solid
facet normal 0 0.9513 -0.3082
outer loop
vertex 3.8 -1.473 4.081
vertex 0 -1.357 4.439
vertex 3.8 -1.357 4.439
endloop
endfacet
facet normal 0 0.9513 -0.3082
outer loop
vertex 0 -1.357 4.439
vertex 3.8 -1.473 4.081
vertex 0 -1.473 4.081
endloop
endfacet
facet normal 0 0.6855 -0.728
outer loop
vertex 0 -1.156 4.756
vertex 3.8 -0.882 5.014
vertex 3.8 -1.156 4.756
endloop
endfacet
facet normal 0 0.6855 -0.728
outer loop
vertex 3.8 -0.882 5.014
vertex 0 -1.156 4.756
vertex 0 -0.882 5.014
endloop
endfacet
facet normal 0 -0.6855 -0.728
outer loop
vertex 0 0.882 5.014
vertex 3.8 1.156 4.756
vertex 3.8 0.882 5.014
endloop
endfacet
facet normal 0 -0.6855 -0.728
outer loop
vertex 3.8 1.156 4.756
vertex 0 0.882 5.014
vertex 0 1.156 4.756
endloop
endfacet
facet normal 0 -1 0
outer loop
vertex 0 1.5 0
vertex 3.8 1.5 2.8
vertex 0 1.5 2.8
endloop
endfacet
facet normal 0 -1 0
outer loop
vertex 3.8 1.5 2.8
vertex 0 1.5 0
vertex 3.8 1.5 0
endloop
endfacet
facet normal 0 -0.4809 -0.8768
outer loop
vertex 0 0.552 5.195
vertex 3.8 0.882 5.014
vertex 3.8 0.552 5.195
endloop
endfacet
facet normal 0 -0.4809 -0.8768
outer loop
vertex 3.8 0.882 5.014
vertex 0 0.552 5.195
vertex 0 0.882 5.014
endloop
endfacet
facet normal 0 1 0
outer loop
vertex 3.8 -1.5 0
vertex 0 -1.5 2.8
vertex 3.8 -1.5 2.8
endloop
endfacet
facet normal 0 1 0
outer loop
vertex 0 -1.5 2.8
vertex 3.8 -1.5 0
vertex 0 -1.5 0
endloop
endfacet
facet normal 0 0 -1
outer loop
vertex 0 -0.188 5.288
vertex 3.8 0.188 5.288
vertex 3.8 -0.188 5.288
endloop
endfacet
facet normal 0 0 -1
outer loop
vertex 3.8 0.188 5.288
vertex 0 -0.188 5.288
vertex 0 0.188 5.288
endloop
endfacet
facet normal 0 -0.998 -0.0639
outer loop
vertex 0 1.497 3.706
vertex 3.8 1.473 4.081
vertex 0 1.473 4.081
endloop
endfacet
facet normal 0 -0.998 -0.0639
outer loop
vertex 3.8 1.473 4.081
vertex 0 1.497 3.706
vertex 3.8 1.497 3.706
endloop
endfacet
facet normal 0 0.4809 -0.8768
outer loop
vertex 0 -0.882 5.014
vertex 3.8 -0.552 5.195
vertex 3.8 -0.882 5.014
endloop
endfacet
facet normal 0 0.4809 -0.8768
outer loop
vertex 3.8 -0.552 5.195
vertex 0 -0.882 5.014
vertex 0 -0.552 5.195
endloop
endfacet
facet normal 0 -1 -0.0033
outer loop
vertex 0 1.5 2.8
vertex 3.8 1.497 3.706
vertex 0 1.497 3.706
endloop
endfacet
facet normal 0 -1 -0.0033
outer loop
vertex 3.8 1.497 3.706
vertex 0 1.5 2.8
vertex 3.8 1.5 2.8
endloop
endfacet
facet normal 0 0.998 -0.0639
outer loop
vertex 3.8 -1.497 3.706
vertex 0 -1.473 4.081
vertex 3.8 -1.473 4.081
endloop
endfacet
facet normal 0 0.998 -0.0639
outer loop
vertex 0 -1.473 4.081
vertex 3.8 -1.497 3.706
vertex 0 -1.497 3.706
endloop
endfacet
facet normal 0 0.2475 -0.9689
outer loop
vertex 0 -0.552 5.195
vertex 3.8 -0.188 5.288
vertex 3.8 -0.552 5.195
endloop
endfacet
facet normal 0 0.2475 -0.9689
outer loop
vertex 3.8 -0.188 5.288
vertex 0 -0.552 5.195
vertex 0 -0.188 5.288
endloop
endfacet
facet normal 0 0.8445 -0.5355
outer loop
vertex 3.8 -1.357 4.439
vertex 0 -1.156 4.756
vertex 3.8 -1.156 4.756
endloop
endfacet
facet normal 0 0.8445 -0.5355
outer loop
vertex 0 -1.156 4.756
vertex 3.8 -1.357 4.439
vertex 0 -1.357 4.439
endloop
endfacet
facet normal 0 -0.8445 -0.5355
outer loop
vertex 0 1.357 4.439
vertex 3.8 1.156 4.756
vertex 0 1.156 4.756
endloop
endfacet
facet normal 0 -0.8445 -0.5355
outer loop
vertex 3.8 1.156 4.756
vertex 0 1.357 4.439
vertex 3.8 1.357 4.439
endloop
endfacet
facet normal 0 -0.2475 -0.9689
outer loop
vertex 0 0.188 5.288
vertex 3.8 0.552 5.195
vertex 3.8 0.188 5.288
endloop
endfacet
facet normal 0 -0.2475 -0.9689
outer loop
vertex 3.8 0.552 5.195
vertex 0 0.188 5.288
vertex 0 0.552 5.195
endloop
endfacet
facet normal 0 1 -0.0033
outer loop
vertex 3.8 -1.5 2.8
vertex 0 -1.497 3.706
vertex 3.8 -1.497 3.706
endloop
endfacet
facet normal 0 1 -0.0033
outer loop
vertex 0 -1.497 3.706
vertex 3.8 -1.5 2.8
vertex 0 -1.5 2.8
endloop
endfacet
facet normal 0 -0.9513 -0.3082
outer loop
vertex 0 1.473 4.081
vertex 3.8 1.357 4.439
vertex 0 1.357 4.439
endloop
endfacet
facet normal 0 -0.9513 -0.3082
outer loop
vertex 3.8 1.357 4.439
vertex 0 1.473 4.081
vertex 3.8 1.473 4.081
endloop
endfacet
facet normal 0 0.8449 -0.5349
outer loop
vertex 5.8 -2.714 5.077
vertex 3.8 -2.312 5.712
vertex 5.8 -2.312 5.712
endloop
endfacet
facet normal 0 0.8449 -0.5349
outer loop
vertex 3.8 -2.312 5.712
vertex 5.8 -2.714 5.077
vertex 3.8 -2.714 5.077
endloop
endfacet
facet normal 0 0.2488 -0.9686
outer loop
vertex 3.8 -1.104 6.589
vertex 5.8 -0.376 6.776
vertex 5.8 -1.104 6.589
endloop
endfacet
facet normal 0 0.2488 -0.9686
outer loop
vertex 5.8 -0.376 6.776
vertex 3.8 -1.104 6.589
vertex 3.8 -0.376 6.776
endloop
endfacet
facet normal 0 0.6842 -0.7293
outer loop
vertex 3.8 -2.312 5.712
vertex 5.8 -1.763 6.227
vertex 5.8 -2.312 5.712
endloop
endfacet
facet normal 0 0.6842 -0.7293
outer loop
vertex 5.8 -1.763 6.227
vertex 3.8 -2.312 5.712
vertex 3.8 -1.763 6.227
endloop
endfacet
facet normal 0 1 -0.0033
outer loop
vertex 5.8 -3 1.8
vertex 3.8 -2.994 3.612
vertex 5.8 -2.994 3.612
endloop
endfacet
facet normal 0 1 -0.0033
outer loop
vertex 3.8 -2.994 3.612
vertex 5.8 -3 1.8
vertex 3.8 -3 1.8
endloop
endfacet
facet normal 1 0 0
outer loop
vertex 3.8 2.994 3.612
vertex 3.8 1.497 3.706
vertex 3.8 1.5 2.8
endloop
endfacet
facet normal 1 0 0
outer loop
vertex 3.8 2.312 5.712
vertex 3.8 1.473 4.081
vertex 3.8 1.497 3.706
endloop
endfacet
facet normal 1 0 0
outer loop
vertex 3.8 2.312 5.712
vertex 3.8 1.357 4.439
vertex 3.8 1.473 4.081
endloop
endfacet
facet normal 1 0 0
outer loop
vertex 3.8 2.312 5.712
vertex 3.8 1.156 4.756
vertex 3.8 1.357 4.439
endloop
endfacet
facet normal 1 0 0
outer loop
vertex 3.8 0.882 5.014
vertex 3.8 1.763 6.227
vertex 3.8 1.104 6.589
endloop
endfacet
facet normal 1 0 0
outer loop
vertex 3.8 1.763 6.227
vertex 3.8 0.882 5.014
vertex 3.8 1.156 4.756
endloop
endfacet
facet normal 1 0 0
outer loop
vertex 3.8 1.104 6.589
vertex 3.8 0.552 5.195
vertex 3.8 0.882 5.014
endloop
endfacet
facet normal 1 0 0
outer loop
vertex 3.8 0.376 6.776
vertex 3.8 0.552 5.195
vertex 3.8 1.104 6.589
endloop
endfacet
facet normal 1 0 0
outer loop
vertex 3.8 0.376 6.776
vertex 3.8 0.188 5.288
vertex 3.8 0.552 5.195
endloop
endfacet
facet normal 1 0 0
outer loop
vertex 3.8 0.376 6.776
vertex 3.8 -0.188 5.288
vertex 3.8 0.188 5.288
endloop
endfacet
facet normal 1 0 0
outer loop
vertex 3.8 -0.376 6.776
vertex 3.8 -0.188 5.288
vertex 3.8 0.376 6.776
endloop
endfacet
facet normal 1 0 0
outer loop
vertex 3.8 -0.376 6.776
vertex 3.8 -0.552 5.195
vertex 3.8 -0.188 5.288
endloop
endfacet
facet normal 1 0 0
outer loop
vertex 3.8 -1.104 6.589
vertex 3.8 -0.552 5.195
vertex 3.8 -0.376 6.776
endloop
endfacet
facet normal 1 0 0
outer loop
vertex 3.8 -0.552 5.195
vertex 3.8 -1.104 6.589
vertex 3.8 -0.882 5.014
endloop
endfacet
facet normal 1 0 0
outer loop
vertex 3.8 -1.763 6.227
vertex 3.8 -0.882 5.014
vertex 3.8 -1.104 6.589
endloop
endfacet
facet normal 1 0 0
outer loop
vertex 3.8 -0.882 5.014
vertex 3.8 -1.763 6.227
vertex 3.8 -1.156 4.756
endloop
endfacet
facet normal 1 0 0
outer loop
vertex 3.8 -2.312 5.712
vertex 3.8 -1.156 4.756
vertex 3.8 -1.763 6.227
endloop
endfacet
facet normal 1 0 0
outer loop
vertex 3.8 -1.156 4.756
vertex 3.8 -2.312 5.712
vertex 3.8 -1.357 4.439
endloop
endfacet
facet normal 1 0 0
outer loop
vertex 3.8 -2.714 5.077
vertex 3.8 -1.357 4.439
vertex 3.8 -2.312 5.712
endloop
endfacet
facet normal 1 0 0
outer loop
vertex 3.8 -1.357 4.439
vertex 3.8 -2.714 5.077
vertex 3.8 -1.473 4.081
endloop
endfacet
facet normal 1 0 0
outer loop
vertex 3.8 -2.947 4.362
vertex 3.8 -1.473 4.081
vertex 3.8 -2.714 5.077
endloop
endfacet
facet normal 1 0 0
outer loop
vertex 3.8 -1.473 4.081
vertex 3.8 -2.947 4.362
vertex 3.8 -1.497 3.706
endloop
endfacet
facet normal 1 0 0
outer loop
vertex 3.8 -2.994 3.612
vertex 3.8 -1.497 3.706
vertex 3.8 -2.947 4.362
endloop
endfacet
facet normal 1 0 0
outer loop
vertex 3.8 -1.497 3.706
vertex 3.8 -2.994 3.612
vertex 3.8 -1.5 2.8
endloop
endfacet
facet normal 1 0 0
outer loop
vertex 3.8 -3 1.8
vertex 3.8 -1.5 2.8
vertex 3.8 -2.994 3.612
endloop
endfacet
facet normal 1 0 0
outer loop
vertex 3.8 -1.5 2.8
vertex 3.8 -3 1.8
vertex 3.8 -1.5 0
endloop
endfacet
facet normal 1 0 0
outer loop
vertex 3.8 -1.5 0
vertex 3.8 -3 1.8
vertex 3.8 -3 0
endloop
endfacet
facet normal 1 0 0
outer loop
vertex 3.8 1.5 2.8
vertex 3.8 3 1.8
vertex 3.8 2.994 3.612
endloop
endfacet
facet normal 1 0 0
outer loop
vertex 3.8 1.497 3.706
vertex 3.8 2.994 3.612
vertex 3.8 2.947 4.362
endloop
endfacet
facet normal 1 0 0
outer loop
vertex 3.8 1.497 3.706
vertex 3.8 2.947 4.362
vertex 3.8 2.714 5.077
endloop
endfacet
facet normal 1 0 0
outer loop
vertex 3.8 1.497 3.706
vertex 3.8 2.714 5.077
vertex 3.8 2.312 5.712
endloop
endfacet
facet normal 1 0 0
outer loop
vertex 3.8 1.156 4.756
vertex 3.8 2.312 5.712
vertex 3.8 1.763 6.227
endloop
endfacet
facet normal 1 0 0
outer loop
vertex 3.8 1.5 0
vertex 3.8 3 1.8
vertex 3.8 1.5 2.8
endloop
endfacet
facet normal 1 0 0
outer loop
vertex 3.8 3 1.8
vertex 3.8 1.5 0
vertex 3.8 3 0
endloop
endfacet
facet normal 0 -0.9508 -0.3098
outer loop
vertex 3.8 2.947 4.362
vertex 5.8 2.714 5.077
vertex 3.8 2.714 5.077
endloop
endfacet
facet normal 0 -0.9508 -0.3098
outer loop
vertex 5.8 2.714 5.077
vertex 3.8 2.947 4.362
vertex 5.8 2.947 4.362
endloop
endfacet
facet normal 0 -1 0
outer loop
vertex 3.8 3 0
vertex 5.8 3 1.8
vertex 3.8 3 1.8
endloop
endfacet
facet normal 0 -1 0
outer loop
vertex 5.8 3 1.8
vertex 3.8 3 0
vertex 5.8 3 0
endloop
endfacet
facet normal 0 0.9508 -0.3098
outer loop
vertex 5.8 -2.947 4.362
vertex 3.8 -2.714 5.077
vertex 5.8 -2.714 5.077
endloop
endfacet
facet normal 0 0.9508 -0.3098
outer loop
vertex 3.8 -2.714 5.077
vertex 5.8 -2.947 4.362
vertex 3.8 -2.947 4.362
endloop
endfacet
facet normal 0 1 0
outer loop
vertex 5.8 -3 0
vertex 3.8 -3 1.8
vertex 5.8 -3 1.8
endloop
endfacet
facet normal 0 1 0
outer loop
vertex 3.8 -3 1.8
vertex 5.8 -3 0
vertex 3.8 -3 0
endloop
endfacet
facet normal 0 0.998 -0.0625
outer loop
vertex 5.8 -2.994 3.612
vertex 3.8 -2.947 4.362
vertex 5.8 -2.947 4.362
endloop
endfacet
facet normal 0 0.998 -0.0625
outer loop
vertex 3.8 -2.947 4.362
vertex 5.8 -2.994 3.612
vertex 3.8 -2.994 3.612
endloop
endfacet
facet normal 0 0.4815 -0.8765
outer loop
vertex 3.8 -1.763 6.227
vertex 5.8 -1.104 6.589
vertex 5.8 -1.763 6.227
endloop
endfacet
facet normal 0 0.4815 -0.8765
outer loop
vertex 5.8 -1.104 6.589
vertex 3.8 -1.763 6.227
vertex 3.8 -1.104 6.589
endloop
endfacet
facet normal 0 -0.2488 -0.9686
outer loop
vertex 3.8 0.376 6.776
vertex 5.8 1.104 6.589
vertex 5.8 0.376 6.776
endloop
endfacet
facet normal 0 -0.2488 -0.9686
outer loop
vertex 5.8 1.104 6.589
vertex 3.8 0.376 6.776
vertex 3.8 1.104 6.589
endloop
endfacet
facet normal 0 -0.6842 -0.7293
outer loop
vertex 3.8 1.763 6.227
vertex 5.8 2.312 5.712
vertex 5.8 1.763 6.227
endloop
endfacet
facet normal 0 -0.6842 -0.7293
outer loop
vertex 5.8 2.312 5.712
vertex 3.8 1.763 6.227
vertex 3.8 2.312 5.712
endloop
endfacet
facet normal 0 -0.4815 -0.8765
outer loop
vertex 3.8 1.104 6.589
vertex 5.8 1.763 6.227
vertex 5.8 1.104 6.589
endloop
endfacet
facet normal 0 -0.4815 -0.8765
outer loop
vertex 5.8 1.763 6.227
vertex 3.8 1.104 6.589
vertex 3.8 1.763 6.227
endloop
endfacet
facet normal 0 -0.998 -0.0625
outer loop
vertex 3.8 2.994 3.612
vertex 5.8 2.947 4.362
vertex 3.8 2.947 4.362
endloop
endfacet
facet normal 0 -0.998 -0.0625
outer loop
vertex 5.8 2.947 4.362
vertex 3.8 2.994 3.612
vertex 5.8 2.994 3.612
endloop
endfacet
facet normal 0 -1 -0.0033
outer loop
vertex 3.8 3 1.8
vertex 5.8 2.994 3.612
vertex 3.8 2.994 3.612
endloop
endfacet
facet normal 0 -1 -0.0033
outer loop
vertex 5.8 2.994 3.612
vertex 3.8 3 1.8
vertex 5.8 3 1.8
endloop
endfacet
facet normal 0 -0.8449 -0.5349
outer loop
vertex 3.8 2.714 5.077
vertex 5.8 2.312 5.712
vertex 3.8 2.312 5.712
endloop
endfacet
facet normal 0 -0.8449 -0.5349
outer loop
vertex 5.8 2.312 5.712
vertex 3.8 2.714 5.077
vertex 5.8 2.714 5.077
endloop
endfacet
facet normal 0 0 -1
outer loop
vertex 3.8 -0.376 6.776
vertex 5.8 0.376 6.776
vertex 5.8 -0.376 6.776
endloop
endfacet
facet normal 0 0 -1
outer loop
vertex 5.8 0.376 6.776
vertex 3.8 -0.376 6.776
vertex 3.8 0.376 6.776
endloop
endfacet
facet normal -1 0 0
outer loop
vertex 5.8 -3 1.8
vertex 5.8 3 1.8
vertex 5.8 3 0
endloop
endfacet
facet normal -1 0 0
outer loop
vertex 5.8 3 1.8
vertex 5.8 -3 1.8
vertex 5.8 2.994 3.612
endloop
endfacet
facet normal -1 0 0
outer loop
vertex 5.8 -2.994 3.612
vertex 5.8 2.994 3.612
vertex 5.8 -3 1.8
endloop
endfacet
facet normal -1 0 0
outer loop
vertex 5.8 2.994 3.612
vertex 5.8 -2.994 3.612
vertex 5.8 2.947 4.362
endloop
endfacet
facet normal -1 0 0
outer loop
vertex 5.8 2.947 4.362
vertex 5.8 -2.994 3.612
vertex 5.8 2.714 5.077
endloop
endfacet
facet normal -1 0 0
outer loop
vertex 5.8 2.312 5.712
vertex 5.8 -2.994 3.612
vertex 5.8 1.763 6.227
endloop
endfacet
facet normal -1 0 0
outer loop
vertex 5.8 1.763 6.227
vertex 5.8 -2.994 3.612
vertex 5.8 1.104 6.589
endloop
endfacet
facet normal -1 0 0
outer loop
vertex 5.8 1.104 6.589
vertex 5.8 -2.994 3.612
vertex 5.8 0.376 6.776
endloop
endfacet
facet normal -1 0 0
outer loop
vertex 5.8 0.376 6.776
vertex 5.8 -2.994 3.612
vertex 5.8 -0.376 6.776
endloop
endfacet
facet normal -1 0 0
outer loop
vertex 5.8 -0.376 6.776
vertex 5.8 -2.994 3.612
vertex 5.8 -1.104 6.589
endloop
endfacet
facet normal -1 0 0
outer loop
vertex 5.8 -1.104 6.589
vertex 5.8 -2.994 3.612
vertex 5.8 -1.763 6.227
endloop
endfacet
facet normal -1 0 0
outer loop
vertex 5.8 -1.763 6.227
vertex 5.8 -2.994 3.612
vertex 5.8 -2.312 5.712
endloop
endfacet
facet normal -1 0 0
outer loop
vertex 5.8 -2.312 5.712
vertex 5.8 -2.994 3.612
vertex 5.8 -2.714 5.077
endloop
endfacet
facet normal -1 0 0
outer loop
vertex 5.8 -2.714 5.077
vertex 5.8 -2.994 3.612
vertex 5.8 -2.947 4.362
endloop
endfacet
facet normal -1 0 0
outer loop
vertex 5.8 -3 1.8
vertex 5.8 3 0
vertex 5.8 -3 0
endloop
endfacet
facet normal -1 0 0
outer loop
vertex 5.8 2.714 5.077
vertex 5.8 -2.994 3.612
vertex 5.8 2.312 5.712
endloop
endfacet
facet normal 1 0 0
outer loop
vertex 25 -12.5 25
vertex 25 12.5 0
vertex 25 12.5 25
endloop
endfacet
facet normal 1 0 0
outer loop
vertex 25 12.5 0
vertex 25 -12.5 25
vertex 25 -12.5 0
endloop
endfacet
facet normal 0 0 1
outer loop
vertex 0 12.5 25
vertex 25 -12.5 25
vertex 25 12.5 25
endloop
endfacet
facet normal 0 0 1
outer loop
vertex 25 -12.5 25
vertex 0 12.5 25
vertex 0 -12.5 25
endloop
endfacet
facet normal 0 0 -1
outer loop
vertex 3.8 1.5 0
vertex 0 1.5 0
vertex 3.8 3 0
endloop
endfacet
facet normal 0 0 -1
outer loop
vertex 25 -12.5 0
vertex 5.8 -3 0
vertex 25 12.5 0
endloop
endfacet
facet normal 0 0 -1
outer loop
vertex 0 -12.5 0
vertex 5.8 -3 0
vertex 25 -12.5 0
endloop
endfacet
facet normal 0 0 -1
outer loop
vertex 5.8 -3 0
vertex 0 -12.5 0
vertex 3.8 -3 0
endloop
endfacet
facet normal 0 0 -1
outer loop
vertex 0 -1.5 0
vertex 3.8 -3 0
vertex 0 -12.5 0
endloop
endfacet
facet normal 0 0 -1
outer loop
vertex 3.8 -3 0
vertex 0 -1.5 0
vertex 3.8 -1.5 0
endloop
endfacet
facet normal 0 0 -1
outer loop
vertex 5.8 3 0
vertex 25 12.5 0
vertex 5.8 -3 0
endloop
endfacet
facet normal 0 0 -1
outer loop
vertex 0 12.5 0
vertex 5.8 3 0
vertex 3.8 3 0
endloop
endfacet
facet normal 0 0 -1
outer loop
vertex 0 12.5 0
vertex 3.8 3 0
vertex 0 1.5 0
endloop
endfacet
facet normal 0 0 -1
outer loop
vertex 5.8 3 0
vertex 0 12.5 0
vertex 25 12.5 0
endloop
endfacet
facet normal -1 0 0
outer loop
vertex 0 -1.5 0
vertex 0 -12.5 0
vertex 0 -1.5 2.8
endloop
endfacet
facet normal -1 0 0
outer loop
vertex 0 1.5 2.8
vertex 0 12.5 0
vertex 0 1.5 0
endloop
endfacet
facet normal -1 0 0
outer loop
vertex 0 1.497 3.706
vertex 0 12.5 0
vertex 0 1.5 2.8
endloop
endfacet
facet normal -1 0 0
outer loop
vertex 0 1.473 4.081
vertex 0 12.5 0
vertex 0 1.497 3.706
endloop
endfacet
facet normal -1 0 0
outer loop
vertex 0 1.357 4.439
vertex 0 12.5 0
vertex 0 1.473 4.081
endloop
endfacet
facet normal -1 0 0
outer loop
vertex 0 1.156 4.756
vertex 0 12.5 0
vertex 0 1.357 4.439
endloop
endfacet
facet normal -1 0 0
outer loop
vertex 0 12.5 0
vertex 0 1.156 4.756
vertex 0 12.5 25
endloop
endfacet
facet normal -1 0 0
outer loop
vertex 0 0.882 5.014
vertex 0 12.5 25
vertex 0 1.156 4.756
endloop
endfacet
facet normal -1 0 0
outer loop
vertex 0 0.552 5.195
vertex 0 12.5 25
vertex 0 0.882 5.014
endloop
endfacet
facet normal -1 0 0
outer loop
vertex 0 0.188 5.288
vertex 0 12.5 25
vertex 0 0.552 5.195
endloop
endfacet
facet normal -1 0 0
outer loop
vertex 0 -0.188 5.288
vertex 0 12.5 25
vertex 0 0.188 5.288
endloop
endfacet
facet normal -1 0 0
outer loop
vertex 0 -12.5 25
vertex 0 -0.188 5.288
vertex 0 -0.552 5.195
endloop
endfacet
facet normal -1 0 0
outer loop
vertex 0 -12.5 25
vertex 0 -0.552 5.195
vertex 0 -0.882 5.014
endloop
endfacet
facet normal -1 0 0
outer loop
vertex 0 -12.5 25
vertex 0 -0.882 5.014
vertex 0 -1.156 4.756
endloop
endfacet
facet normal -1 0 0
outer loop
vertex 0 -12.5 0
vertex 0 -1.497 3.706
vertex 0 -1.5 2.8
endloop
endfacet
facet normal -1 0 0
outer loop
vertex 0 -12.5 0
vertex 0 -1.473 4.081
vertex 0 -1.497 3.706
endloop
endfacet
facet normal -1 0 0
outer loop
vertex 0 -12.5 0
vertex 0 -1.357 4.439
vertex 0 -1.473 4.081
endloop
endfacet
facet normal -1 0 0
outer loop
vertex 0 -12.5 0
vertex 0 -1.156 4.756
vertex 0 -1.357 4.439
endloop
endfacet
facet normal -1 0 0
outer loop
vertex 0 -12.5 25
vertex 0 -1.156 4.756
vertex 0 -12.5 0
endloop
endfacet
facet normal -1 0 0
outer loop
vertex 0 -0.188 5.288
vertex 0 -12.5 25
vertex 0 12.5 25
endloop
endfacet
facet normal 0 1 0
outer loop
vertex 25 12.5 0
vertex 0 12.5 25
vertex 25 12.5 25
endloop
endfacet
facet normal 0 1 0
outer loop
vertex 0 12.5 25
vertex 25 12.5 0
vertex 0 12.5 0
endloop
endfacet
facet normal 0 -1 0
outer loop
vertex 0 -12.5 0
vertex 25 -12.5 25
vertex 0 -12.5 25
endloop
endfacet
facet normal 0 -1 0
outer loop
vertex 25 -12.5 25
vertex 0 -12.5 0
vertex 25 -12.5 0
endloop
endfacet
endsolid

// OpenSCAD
// file: params.scad
/*

Values in `camelCase` are user-variable (within reason); 
values like numNeedles and screwDiam, etc.,  can be modified to
accommodate user preference or hardware subsitution. 

Values in `ALL_CAPS` should be considered CONSTANTS and should
only be modified with *extreme caution* as they will affect the 
relationship between the needles and the cams, which could
prevent stitches from forming correctly.

I recommend only modifying these constants if you are also 
making changes to the cam design in the technical sketch.
*/

gauge = 6.5;
numNeedles = 25;
tolerance = 0.2; // allows a bit of room for parts that have to fit together; adjust according to your printer's precision

// ---
// Hardware dimensions 
// (actual measurements, no tolerances)

// - pan head 6-32 machine screws
screwDiam = 3.45;
screwHeight = 18;
screwHeadDiam = 6.75; 
screwHeadHeight = 2.55;
nutWidth = 7.9;
nutHeight = 2.8;

// ---
// Needle dimensions
// - Brother needles
BUTT_HEIGHT = 15;
NEEDLE_WIDTH = 1.25;
NEEDLE_LEG_HEIGHT = 1.85;

// ---
// Needle Bed Zones
BACK_COVER = 45;
OOW_TRACK = 8;
B_TRACK = 42; // will divvy up working tracks (B & C position) later
C_TRACK = 0;
WORKING_TRACK = B_TRACK + C_TRACK;
HOLD_TRACK = 8;
SPONGE_BAR = 12;
COMB = 29;
NEEDLE_EXTENSION = 34.5;
YARN_DEPOSIT_Y = 155.1;

// ---
// Needle bed dimensions
NEEDLE_BED_DEPTH = BACK_COVER + OOW_TRACK + WORKING_TRACK + HOLD_TRACK + SPONGE_BAR + COMB;
needleBedHeight = BUTT_HEIGHT;// screwHeight + 2;
needleSlotHeight = NEEDLE_LEG_HEIGHT * 2 + screwHeadHeight;
needleSlotWidth = NEEDLE_WIDTH + 0.25; // add a small amount of clearance
combWidth = gauge*2/3; // width of cutouts for stitch formation; this gives room for the thickness of the yarn looped around the needle when it pulls back into the slot, but has to balance leaving enough material for the remaining "teeth" to not be too fragile
spongeThickness = 2.5;
spongeBarThickness = needleSlotHeight - NEEDLE_LEG_HEIGHT - spongeThickness;
//echo(spongeBarThickness);

// ---
// Carriage dimensions
// refer to technical sketch
camHeight = BUTT_HEIGHT; // thickness of the tracks the needles ride along
camPlateHeight = 3; // plate behind the cams
CAM_PLATE_WIDTH = 88 * 2; 
CAM_PLATE_DEPTH = NEEDLE_BED_DEPTH - COMB + 6;

railDepth = 8;
railHeight = 8; // ???
xOffset = 19.5;
vCamScrews = [[34-xOffset, -90.25, 0],[58-xOffset, -74.25, 0],[86-xOffset,-90.25, 0]];
// main file
include<params.scad>;
//include<needlebed.scad>;

difference() {
    translate([0,-25/2,0])
    cube(25);
    translate([-tolerance, 0, -tolerance])
    // female
    connector();
}

//union() {
//    translate([-(25+tolerance),-25/2,0])
//    cube(25);
//    translate([-tolerance,0,0])
//    // male
//    connector(tolerance = tolerance);
//}


module connector(top = 7, diam = 3, pinWidth = 4, plugDiam = 6, tolerance = 0) {
    union() {
        hull() {
            translate([(pinWidth + tolerance*2)/2 + 0.25,0,(top - tolerance) - (plugDiam - tolerance*2)/2])
            rotate([0,90,0])
            cylinder(h = pinWidth + tolerance*2 + 0.5, d = diam - tolerance*2, center = true, $fn = 25);
            translate([(pinWidth + tolerance*2)/2 + 0.25,0,(diam - tolerance*2)/2])
            cube([pinWidth + tolerance*2 + 0.5,diam - tolerance*2,diam - tolerance*2], center = true);    
        }
        hull() {
            translate([pinWidth/4 + (pinWidth - tolerance/4),0,(top - tolerance) - (plugDiam - tolerance*2)/2])
            rotate([0,90,0])
            cylinder(h = pinWidth/2 - tolerance*2, d = plugDiam - tolerance*2, center = true, $fn = 25);
            translate([pinWidth/4 + (pinWidth - tolerance/4),0,1])
            cube([pinWidth/2 - tolerance*2,plugDiam - tolerance*2,2], center = true);    
        }
}
}
